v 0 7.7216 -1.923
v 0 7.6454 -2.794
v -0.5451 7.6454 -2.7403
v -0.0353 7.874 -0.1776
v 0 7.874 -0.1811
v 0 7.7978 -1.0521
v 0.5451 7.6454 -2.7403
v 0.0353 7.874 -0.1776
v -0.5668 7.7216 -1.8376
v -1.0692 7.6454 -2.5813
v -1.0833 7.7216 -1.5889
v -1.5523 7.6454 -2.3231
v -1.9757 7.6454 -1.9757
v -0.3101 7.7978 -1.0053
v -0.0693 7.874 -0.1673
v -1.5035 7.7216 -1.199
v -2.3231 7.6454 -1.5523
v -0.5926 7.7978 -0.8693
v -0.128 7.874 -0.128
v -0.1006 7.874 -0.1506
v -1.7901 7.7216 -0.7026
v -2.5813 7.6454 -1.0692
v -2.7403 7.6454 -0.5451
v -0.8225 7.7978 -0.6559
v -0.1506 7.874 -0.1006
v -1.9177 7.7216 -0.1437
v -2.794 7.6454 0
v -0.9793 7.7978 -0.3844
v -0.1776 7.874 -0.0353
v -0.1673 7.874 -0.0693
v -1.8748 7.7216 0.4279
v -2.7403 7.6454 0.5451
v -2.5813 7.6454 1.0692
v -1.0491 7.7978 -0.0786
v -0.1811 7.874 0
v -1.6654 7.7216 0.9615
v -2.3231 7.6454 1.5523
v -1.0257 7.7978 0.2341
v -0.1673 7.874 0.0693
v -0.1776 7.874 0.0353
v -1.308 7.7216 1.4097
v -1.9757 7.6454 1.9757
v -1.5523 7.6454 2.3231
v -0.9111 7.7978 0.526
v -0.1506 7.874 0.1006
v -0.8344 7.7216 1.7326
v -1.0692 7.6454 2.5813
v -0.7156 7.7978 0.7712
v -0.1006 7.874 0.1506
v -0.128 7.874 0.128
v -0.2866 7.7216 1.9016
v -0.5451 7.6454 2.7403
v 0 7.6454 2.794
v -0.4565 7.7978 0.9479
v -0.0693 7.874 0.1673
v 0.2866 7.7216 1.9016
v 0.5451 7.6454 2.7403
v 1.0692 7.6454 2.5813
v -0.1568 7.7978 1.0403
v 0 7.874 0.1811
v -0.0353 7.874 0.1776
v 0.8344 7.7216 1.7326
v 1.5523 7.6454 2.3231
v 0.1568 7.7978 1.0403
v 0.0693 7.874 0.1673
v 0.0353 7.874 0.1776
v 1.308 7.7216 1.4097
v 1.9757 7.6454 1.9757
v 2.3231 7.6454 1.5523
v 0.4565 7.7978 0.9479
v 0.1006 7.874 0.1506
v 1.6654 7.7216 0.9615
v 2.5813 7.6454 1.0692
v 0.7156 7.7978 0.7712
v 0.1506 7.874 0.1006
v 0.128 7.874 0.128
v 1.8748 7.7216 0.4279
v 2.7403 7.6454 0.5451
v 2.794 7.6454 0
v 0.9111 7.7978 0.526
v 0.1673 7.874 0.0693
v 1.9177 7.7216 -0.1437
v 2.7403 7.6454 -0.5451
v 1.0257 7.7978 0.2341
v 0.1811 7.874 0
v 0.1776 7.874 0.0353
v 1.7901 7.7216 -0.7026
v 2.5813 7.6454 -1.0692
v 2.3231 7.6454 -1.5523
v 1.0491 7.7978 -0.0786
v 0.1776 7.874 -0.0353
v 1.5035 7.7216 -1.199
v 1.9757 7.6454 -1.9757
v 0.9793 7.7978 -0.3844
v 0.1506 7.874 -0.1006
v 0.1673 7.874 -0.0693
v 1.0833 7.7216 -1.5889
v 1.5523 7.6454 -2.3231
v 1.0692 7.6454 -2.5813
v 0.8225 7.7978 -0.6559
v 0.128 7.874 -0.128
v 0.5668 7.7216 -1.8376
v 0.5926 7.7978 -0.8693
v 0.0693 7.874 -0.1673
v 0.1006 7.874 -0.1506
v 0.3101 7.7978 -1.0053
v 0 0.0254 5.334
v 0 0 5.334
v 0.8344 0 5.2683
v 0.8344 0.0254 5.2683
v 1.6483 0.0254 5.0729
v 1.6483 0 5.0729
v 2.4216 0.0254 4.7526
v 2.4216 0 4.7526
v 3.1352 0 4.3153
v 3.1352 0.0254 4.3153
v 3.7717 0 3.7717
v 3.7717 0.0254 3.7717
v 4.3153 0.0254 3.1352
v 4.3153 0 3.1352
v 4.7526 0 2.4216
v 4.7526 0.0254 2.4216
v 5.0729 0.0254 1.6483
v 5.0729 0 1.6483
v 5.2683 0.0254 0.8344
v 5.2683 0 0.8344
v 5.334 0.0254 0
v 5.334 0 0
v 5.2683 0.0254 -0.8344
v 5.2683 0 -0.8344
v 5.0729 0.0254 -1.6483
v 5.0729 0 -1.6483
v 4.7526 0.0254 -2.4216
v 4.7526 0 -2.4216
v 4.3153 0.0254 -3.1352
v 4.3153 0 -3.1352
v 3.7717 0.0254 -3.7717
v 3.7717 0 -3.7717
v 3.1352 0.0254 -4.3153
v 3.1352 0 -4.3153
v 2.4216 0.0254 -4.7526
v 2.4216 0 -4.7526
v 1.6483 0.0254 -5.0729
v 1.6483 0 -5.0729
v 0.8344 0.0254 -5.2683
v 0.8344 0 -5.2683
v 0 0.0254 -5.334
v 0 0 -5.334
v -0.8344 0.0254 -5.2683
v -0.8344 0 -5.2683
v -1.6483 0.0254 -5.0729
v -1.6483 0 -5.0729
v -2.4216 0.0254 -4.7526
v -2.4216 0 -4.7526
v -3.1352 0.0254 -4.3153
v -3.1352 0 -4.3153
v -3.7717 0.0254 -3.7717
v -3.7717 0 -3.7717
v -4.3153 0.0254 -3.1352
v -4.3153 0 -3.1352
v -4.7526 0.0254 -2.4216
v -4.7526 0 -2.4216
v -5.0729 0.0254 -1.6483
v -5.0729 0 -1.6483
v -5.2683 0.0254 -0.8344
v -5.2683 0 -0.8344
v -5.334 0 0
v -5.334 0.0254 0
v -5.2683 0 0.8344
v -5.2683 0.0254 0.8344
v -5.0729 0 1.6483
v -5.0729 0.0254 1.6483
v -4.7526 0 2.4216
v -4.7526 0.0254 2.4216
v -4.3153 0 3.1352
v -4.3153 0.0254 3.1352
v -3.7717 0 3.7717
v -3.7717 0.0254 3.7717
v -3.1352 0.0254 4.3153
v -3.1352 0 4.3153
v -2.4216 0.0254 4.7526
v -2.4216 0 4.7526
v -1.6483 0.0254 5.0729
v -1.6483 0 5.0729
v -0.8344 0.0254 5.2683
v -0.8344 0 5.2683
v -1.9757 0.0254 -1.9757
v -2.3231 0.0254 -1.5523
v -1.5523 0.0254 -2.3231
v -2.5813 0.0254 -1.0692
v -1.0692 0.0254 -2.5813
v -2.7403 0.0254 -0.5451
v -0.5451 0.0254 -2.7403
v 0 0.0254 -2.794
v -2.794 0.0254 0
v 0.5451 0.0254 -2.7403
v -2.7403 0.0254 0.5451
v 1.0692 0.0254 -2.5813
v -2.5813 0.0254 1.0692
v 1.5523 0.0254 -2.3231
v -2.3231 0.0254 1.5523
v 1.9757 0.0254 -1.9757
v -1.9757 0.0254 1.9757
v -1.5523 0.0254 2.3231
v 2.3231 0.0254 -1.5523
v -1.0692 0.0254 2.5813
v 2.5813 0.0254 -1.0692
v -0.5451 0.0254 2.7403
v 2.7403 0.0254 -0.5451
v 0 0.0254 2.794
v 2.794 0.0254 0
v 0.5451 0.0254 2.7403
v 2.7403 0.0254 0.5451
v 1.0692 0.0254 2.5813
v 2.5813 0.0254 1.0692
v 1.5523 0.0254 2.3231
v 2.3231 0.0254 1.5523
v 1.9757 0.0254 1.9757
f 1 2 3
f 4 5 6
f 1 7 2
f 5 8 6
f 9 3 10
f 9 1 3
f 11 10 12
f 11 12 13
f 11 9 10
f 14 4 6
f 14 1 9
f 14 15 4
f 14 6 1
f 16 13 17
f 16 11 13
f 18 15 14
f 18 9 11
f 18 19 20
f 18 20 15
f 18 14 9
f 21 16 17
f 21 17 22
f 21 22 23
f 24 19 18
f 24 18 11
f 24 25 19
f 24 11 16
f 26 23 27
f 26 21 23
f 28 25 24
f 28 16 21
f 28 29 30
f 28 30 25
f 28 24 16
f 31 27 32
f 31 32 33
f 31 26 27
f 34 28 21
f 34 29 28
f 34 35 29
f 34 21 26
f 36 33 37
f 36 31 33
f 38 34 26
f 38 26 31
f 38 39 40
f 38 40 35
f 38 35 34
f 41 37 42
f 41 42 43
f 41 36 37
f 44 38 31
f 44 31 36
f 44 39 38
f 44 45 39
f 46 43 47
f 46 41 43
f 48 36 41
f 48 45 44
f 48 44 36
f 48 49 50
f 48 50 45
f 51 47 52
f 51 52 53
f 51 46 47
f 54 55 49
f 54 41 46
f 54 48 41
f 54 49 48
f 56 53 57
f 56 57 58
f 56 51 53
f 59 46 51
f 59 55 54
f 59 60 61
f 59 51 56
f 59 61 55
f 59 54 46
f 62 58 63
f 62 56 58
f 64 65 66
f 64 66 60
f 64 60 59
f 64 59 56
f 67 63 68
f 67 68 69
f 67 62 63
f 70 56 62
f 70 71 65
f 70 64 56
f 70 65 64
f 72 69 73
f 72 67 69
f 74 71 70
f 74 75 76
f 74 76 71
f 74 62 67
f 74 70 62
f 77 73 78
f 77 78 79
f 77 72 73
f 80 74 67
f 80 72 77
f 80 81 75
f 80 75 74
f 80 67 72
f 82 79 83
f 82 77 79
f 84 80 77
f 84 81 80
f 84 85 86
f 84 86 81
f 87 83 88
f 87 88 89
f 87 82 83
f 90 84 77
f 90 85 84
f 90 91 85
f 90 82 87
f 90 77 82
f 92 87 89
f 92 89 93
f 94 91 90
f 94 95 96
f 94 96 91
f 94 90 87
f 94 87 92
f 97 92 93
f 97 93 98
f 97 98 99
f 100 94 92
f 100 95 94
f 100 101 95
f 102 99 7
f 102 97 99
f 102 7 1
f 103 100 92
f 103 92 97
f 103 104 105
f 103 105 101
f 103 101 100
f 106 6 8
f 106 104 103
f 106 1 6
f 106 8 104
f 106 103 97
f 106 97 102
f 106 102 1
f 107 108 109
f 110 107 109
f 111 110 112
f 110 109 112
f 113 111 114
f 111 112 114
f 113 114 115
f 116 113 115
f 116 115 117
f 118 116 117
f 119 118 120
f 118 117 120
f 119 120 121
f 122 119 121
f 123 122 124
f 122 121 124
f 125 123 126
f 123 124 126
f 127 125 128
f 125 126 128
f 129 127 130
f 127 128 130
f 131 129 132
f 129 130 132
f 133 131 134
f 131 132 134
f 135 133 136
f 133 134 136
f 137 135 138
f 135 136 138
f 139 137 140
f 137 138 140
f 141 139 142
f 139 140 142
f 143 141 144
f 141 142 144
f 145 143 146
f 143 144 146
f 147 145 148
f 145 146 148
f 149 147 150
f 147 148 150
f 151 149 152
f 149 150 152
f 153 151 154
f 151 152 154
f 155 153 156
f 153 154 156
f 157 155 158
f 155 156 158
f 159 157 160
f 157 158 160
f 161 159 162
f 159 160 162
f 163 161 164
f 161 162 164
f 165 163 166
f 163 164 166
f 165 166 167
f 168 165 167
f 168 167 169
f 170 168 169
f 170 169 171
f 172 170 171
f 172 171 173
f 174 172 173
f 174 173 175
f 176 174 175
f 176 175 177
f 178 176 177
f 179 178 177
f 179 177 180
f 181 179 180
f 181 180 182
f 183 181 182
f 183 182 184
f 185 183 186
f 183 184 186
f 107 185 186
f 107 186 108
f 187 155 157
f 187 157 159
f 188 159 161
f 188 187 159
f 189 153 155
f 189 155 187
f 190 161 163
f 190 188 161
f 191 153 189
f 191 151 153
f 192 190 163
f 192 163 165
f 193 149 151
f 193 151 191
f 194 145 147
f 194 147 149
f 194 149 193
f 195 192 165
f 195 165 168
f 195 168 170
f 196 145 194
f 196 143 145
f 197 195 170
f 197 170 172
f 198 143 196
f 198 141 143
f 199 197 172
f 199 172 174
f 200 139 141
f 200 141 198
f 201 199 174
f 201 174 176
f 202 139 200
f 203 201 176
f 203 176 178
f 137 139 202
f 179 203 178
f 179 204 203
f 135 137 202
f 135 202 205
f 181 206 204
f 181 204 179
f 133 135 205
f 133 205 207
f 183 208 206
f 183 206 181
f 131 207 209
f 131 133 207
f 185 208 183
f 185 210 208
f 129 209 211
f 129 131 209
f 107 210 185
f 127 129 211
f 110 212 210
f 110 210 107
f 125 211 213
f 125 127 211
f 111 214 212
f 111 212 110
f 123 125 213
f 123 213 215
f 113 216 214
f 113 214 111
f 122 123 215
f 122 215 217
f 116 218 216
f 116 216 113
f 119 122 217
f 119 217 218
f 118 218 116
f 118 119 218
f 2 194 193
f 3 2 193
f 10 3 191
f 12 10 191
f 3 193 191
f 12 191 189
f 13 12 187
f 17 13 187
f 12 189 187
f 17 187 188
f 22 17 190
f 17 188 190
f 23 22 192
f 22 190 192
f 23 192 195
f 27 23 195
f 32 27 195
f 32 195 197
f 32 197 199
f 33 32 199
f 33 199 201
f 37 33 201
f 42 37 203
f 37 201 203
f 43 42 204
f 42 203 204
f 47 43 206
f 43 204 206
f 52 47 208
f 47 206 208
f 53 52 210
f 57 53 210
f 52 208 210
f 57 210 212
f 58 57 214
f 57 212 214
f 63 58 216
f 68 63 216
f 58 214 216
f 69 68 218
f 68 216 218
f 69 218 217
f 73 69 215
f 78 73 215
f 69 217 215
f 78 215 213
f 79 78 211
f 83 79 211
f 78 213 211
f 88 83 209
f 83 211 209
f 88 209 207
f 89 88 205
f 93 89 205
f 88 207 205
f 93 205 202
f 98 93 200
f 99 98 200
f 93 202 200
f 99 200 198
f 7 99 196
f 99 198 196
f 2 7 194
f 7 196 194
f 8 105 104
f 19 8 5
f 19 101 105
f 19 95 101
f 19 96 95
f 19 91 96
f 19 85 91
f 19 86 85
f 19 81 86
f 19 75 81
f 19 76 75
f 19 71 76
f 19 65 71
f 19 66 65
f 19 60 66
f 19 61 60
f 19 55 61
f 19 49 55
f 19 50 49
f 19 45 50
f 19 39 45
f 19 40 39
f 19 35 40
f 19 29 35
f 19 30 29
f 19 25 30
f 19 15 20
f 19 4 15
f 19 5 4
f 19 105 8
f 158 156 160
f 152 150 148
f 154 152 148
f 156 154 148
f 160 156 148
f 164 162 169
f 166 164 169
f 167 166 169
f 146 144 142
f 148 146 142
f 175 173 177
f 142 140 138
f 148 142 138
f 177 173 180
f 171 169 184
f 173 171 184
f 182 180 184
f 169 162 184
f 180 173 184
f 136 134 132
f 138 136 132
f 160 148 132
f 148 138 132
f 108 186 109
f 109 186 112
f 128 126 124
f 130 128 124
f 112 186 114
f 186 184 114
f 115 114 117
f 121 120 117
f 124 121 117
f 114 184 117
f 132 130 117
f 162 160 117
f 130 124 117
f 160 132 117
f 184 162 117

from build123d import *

# Parameters (mm, degrees)
SKETCH1_R           = 5.334
BOSS_EXTRUDE2_DEPTH = 0.0254
SKETCH2_R           = 2.794
BOSS_EXTRUDE4_DEPTH = 7.62
SKETCH3_R           = 2.794
BOSS_EXTRUDE5_DEPTH = 0.2286
BOSS_EXTRUDE5_TAPER = 84.999999999


with BuildPart() as part:
    # Sketch1 → Boss-Extrude2 (new body)
    with BuildSketch(Plane(origin=(0, 0, 0), x_dir=(1, 0, 0), z_dir=(0, 1, 0))):
        with Locations(Location((0, 0, 0), (0, 0, 270))):
            Circle(SKETCH1_R)
    extrude(amount=BOSS_EXTRUDE2_DEPTH)

    # Sketch2 → Boss-Extrude4 (add)
    with BuildSketch(Plane(origin=(0, 0.0254, 0), x_dir=(1, 0, 0), z_dir=(0, 1, 0))):
        with Locations(Location((0, 0, 0), (0, 0, 90))):
            Circle(SKETCH2_R)
    extrude(amount=BOSS_EXTRUDE4_DEPTH)

    # Sketch3 → Boss-Extrude5 (add)
    with BuildSketch(Plane(origin=(0, 7.6454, 0), x_dir=(1, 0, 0), z_dir=(0, 1, 0))):
        with Locations(Location((0, 0, 0), (0, 0, 90))):
            Circle(SKETCH3_R)
    extrude(amount=BOSS_EXTRUDE5_DEPTH, taper=BOSS_EXTRUDE5_TAPER)


solid = part.part
